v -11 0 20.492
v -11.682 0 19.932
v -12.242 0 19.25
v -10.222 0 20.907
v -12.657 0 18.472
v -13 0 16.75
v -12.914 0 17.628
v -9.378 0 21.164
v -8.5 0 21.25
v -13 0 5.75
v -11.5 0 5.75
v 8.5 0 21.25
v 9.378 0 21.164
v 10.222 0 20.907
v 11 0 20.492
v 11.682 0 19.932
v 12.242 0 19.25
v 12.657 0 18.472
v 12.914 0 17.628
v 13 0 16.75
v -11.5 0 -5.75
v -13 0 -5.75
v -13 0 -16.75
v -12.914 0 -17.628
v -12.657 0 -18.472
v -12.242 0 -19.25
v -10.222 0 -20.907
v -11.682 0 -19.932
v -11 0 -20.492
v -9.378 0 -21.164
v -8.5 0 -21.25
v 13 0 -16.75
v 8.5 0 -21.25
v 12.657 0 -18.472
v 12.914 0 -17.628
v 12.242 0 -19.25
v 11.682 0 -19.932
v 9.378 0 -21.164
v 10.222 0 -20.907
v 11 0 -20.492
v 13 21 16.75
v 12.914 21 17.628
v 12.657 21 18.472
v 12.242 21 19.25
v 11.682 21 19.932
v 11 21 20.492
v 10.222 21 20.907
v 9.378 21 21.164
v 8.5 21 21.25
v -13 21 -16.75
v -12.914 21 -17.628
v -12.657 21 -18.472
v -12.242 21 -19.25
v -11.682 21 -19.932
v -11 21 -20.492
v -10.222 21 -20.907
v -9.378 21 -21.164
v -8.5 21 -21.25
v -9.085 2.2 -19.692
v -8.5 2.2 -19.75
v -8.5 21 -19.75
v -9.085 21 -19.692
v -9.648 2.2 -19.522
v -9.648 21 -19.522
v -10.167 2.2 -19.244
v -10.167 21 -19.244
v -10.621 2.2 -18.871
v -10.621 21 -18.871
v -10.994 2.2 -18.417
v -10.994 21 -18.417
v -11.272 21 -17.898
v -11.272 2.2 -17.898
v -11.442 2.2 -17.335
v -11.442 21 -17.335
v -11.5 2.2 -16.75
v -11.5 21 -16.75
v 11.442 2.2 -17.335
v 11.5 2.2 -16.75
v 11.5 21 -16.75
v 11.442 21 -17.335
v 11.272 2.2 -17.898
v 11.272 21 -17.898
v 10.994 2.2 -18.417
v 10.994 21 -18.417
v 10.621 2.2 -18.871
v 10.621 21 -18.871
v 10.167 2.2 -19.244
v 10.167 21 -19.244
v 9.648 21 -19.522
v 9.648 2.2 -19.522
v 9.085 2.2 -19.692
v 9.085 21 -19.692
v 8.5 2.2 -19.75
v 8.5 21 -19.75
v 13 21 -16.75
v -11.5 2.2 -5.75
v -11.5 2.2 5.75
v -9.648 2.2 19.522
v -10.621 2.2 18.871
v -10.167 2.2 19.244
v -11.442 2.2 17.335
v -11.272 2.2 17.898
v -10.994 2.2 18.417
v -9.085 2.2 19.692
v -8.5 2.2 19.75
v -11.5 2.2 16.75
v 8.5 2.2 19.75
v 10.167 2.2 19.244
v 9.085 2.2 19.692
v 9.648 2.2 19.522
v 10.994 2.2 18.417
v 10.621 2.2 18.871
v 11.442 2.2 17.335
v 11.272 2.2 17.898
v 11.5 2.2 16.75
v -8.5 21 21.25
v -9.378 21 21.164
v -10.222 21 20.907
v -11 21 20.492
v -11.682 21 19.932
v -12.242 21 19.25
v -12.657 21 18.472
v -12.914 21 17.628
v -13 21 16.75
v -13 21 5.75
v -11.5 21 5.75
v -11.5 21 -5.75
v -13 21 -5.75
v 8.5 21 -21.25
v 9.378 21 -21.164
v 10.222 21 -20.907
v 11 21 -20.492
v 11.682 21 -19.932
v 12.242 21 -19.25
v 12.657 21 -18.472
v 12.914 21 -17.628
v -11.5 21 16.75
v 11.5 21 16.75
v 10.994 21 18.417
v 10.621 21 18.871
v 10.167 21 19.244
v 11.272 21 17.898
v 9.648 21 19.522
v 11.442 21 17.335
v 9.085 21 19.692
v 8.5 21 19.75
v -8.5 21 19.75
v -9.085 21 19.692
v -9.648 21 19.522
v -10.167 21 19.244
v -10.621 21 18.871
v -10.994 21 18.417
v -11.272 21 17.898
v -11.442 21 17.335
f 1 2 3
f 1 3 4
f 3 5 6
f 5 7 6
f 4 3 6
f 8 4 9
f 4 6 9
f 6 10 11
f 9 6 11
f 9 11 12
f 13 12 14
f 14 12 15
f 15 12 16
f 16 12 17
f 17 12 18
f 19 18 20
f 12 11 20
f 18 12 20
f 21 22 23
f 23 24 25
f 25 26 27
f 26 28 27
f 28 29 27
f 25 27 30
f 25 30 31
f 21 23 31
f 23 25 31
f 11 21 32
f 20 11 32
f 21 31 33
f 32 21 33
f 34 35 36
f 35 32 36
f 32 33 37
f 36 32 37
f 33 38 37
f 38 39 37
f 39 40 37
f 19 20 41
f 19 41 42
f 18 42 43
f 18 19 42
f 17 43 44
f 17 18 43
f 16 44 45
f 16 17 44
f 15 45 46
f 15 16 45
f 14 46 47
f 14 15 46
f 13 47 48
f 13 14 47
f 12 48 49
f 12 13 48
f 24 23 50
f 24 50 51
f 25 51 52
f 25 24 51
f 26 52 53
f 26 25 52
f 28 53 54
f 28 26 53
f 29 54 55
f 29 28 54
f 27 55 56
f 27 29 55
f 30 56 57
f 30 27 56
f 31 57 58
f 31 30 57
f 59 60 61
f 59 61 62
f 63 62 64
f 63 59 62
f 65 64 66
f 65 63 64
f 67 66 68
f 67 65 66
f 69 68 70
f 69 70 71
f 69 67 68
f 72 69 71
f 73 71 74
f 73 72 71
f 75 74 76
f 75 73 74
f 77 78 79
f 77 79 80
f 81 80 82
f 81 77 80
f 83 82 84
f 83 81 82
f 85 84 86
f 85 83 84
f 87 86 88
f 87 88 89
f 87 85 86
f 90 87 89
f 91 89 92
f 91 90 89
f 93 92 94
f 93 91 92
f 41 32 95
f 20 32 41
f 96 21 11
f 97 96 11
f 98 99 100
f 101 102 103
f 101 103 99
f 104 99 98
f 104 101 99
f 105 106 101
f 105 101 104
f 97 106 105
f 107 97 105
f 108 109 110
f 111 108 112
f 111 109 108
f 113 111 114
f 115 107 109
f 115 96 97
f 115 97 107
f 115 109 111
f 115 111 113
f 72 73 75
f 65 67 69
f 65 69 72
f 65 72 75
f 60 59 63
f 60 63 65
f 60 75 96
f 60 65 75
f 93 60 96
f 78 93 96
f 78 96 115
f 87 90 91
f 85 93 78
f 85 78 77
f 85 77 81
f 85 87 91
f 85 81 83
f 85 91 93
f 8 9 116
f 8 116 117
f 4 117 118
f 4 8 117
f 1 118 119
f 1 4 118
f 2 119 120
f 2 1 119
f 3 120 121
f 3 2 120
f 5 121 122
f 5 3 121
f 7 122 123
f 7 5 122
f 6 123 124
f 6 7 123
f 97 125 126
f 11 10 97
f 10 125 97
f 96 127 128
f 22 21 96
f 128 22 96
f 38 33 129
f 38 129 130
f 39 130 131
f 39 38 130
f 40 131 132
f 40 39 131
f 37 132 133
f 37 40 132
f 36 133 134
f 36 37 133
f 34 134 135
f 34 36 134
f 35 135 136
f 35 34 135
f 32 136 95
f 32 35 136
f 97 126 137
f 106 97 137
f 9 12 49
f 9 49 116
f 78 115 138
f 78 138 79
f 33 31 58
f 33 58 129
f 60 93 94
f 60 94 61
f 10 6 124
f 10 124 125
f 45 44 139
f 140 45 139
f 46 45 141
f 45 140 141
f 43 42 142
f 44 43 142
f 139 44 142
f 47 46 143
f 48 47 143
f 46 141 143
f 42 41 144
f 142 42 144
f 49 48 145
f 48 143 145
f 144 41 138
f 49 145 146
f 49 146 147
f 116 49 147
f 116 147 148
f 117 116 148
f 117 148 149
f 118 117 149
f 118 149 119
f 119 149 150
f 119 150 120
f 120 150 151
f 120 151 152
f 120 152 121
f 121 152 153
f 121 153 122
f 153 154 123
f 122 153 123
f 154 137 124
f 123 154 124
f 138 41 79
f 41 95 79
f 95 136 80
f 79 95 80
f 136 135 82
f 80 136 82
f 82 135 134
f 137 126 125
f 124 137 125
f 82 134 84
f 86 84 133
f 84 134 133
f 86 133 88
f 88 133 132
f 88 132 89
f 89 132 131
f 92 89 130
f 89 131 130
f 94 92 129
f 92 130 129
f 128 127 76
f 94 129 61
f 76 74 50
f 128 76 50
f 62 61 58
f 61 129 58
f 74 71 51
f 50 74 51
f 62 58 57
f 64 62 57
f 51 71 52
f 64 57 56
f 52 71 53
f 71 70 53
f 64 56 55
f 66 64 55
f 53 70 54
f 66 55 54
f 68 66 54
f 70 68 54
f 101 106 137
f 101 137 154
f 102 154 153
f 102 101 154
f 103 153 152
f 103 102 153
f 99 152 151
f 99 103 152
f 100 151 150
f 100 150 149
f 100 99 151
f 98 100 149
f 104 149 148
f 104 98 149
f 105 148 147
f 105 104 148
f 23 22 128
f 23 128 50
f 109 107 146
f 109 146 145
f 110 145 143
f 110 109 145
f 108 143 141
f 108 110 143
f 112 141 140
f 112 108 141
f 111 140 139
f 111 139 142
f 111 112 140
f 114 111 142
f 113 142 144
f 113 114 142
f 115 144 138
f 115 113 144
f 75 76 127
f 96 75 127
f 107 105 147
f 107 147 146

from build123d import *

# Parameters (mm, degrees)
EXTRUDE_1_DEPTH   = 21
EXTRUDE_1_2_DEPTH = 2.2


with BuildPart() as part:
    # 草图2 → Extrude 1 (new body)
    with BuildSketch(Plane(origin=(0, 0, 0), x_dir=(1, 0, 0), z_dir=(0, 1, 0))):
        with BuildLine():
            Line((-11.5, -5.75), (-11.5, -16.75))
            ThreePointArc((-11.5, -16.75), (-10.621320344, -18.871320344), (-8.5, -19.75))
            Line((-8.5, -19.75), (8.5, -19.75))
            ThreePointArc((8.5, -19.75), (10.621320344, -18.871320344), (11.5, -16.75))
            Line((11.5, -16.75), (11.5, 16.75))
            ThreePointArc((11.5, 16.75), (10.621320344, 18.871320344), (8.5, 19.75))
            Line((8.5, 19.75), (-8.5, 19.75))
            ThreePointArc((-8.5, 19.75), (-10.621320344, 18.871320344), (-11.5, 16.75))
            Line((-11.5, 16.75), (-11.5, 5.75))
            Line((-11.5, 5.75), (-13, 5.75))
            Line((-13, 5.75), (-13, 16.75))
            ThreePointArc((-13, 16.75), (-11.681980515, 19.931980515), (-8.5, 21.25))
            Line((-8.5, 21.25), (8.5, 21.25))
            ThreePointArc((8.5, 21.25), (11.681980515, 19.931980515), (13, 16.75))
            Line((13, 16.75), (13, -16.75))
            ThreePointArc((13, -16.75), (11.681980515, -19.931980515), (8.5, -21.25))
            Line((8.5, -21.25), (-8.5, -21.25))
            ThreePointArc((-8.5, -21.25), (-11.681980515, -19.931980515), (-13, -16.75))
            Line((-13, -16.75), (-13, -5.75))
            Line((-13, -5.75), (-11.5, -5.75))
        make_face()
    extrude(amount=EXTRUDE_1_DEPTH)

    # 草图3 → Extrude 1 2 (add)
    with BuildSketch(Plane(origin=(0, 0, 0), x_dir=(1, 0, 0), z_dir=(0, 1, 0))):
        with BuildLine():
            Line((-8.5, -19.75), (8.5, -19.75))
            ThreePointArc((8.5, -19.75), (10.621320344, -18.871320344), (11.5, -16.75))
            Line((11.5, -16.75), (11.5, 16.75))
            ThreePointArc((11.5, 16.75), (10.621320344, 18.871320344), (8.5, 19.75))
            Line((8.5, 19.75), (-8.5, 19.75))
            ThreePointArc((-8.5, 19.75), (-10.621320344, 18.871320344), (-11.5, 16.75))
            Line((-11.5, 16.75), (-11.5, 5.75))
            Line((-11.5, 5.75), (-11.5, 0))
            Line((-11.5, 0), (-11.5, -5.75))
            Line((-11.5, -5.75), (-11.5, -16.75))
            ThreePointArc((-11.5, -16.75), (-10.621320344, -18.871320344), (-8.5, -19.75))
        make_face()
    extrude(amount=EXTRUDE_1_2_DEPTH)


solid = part.part
